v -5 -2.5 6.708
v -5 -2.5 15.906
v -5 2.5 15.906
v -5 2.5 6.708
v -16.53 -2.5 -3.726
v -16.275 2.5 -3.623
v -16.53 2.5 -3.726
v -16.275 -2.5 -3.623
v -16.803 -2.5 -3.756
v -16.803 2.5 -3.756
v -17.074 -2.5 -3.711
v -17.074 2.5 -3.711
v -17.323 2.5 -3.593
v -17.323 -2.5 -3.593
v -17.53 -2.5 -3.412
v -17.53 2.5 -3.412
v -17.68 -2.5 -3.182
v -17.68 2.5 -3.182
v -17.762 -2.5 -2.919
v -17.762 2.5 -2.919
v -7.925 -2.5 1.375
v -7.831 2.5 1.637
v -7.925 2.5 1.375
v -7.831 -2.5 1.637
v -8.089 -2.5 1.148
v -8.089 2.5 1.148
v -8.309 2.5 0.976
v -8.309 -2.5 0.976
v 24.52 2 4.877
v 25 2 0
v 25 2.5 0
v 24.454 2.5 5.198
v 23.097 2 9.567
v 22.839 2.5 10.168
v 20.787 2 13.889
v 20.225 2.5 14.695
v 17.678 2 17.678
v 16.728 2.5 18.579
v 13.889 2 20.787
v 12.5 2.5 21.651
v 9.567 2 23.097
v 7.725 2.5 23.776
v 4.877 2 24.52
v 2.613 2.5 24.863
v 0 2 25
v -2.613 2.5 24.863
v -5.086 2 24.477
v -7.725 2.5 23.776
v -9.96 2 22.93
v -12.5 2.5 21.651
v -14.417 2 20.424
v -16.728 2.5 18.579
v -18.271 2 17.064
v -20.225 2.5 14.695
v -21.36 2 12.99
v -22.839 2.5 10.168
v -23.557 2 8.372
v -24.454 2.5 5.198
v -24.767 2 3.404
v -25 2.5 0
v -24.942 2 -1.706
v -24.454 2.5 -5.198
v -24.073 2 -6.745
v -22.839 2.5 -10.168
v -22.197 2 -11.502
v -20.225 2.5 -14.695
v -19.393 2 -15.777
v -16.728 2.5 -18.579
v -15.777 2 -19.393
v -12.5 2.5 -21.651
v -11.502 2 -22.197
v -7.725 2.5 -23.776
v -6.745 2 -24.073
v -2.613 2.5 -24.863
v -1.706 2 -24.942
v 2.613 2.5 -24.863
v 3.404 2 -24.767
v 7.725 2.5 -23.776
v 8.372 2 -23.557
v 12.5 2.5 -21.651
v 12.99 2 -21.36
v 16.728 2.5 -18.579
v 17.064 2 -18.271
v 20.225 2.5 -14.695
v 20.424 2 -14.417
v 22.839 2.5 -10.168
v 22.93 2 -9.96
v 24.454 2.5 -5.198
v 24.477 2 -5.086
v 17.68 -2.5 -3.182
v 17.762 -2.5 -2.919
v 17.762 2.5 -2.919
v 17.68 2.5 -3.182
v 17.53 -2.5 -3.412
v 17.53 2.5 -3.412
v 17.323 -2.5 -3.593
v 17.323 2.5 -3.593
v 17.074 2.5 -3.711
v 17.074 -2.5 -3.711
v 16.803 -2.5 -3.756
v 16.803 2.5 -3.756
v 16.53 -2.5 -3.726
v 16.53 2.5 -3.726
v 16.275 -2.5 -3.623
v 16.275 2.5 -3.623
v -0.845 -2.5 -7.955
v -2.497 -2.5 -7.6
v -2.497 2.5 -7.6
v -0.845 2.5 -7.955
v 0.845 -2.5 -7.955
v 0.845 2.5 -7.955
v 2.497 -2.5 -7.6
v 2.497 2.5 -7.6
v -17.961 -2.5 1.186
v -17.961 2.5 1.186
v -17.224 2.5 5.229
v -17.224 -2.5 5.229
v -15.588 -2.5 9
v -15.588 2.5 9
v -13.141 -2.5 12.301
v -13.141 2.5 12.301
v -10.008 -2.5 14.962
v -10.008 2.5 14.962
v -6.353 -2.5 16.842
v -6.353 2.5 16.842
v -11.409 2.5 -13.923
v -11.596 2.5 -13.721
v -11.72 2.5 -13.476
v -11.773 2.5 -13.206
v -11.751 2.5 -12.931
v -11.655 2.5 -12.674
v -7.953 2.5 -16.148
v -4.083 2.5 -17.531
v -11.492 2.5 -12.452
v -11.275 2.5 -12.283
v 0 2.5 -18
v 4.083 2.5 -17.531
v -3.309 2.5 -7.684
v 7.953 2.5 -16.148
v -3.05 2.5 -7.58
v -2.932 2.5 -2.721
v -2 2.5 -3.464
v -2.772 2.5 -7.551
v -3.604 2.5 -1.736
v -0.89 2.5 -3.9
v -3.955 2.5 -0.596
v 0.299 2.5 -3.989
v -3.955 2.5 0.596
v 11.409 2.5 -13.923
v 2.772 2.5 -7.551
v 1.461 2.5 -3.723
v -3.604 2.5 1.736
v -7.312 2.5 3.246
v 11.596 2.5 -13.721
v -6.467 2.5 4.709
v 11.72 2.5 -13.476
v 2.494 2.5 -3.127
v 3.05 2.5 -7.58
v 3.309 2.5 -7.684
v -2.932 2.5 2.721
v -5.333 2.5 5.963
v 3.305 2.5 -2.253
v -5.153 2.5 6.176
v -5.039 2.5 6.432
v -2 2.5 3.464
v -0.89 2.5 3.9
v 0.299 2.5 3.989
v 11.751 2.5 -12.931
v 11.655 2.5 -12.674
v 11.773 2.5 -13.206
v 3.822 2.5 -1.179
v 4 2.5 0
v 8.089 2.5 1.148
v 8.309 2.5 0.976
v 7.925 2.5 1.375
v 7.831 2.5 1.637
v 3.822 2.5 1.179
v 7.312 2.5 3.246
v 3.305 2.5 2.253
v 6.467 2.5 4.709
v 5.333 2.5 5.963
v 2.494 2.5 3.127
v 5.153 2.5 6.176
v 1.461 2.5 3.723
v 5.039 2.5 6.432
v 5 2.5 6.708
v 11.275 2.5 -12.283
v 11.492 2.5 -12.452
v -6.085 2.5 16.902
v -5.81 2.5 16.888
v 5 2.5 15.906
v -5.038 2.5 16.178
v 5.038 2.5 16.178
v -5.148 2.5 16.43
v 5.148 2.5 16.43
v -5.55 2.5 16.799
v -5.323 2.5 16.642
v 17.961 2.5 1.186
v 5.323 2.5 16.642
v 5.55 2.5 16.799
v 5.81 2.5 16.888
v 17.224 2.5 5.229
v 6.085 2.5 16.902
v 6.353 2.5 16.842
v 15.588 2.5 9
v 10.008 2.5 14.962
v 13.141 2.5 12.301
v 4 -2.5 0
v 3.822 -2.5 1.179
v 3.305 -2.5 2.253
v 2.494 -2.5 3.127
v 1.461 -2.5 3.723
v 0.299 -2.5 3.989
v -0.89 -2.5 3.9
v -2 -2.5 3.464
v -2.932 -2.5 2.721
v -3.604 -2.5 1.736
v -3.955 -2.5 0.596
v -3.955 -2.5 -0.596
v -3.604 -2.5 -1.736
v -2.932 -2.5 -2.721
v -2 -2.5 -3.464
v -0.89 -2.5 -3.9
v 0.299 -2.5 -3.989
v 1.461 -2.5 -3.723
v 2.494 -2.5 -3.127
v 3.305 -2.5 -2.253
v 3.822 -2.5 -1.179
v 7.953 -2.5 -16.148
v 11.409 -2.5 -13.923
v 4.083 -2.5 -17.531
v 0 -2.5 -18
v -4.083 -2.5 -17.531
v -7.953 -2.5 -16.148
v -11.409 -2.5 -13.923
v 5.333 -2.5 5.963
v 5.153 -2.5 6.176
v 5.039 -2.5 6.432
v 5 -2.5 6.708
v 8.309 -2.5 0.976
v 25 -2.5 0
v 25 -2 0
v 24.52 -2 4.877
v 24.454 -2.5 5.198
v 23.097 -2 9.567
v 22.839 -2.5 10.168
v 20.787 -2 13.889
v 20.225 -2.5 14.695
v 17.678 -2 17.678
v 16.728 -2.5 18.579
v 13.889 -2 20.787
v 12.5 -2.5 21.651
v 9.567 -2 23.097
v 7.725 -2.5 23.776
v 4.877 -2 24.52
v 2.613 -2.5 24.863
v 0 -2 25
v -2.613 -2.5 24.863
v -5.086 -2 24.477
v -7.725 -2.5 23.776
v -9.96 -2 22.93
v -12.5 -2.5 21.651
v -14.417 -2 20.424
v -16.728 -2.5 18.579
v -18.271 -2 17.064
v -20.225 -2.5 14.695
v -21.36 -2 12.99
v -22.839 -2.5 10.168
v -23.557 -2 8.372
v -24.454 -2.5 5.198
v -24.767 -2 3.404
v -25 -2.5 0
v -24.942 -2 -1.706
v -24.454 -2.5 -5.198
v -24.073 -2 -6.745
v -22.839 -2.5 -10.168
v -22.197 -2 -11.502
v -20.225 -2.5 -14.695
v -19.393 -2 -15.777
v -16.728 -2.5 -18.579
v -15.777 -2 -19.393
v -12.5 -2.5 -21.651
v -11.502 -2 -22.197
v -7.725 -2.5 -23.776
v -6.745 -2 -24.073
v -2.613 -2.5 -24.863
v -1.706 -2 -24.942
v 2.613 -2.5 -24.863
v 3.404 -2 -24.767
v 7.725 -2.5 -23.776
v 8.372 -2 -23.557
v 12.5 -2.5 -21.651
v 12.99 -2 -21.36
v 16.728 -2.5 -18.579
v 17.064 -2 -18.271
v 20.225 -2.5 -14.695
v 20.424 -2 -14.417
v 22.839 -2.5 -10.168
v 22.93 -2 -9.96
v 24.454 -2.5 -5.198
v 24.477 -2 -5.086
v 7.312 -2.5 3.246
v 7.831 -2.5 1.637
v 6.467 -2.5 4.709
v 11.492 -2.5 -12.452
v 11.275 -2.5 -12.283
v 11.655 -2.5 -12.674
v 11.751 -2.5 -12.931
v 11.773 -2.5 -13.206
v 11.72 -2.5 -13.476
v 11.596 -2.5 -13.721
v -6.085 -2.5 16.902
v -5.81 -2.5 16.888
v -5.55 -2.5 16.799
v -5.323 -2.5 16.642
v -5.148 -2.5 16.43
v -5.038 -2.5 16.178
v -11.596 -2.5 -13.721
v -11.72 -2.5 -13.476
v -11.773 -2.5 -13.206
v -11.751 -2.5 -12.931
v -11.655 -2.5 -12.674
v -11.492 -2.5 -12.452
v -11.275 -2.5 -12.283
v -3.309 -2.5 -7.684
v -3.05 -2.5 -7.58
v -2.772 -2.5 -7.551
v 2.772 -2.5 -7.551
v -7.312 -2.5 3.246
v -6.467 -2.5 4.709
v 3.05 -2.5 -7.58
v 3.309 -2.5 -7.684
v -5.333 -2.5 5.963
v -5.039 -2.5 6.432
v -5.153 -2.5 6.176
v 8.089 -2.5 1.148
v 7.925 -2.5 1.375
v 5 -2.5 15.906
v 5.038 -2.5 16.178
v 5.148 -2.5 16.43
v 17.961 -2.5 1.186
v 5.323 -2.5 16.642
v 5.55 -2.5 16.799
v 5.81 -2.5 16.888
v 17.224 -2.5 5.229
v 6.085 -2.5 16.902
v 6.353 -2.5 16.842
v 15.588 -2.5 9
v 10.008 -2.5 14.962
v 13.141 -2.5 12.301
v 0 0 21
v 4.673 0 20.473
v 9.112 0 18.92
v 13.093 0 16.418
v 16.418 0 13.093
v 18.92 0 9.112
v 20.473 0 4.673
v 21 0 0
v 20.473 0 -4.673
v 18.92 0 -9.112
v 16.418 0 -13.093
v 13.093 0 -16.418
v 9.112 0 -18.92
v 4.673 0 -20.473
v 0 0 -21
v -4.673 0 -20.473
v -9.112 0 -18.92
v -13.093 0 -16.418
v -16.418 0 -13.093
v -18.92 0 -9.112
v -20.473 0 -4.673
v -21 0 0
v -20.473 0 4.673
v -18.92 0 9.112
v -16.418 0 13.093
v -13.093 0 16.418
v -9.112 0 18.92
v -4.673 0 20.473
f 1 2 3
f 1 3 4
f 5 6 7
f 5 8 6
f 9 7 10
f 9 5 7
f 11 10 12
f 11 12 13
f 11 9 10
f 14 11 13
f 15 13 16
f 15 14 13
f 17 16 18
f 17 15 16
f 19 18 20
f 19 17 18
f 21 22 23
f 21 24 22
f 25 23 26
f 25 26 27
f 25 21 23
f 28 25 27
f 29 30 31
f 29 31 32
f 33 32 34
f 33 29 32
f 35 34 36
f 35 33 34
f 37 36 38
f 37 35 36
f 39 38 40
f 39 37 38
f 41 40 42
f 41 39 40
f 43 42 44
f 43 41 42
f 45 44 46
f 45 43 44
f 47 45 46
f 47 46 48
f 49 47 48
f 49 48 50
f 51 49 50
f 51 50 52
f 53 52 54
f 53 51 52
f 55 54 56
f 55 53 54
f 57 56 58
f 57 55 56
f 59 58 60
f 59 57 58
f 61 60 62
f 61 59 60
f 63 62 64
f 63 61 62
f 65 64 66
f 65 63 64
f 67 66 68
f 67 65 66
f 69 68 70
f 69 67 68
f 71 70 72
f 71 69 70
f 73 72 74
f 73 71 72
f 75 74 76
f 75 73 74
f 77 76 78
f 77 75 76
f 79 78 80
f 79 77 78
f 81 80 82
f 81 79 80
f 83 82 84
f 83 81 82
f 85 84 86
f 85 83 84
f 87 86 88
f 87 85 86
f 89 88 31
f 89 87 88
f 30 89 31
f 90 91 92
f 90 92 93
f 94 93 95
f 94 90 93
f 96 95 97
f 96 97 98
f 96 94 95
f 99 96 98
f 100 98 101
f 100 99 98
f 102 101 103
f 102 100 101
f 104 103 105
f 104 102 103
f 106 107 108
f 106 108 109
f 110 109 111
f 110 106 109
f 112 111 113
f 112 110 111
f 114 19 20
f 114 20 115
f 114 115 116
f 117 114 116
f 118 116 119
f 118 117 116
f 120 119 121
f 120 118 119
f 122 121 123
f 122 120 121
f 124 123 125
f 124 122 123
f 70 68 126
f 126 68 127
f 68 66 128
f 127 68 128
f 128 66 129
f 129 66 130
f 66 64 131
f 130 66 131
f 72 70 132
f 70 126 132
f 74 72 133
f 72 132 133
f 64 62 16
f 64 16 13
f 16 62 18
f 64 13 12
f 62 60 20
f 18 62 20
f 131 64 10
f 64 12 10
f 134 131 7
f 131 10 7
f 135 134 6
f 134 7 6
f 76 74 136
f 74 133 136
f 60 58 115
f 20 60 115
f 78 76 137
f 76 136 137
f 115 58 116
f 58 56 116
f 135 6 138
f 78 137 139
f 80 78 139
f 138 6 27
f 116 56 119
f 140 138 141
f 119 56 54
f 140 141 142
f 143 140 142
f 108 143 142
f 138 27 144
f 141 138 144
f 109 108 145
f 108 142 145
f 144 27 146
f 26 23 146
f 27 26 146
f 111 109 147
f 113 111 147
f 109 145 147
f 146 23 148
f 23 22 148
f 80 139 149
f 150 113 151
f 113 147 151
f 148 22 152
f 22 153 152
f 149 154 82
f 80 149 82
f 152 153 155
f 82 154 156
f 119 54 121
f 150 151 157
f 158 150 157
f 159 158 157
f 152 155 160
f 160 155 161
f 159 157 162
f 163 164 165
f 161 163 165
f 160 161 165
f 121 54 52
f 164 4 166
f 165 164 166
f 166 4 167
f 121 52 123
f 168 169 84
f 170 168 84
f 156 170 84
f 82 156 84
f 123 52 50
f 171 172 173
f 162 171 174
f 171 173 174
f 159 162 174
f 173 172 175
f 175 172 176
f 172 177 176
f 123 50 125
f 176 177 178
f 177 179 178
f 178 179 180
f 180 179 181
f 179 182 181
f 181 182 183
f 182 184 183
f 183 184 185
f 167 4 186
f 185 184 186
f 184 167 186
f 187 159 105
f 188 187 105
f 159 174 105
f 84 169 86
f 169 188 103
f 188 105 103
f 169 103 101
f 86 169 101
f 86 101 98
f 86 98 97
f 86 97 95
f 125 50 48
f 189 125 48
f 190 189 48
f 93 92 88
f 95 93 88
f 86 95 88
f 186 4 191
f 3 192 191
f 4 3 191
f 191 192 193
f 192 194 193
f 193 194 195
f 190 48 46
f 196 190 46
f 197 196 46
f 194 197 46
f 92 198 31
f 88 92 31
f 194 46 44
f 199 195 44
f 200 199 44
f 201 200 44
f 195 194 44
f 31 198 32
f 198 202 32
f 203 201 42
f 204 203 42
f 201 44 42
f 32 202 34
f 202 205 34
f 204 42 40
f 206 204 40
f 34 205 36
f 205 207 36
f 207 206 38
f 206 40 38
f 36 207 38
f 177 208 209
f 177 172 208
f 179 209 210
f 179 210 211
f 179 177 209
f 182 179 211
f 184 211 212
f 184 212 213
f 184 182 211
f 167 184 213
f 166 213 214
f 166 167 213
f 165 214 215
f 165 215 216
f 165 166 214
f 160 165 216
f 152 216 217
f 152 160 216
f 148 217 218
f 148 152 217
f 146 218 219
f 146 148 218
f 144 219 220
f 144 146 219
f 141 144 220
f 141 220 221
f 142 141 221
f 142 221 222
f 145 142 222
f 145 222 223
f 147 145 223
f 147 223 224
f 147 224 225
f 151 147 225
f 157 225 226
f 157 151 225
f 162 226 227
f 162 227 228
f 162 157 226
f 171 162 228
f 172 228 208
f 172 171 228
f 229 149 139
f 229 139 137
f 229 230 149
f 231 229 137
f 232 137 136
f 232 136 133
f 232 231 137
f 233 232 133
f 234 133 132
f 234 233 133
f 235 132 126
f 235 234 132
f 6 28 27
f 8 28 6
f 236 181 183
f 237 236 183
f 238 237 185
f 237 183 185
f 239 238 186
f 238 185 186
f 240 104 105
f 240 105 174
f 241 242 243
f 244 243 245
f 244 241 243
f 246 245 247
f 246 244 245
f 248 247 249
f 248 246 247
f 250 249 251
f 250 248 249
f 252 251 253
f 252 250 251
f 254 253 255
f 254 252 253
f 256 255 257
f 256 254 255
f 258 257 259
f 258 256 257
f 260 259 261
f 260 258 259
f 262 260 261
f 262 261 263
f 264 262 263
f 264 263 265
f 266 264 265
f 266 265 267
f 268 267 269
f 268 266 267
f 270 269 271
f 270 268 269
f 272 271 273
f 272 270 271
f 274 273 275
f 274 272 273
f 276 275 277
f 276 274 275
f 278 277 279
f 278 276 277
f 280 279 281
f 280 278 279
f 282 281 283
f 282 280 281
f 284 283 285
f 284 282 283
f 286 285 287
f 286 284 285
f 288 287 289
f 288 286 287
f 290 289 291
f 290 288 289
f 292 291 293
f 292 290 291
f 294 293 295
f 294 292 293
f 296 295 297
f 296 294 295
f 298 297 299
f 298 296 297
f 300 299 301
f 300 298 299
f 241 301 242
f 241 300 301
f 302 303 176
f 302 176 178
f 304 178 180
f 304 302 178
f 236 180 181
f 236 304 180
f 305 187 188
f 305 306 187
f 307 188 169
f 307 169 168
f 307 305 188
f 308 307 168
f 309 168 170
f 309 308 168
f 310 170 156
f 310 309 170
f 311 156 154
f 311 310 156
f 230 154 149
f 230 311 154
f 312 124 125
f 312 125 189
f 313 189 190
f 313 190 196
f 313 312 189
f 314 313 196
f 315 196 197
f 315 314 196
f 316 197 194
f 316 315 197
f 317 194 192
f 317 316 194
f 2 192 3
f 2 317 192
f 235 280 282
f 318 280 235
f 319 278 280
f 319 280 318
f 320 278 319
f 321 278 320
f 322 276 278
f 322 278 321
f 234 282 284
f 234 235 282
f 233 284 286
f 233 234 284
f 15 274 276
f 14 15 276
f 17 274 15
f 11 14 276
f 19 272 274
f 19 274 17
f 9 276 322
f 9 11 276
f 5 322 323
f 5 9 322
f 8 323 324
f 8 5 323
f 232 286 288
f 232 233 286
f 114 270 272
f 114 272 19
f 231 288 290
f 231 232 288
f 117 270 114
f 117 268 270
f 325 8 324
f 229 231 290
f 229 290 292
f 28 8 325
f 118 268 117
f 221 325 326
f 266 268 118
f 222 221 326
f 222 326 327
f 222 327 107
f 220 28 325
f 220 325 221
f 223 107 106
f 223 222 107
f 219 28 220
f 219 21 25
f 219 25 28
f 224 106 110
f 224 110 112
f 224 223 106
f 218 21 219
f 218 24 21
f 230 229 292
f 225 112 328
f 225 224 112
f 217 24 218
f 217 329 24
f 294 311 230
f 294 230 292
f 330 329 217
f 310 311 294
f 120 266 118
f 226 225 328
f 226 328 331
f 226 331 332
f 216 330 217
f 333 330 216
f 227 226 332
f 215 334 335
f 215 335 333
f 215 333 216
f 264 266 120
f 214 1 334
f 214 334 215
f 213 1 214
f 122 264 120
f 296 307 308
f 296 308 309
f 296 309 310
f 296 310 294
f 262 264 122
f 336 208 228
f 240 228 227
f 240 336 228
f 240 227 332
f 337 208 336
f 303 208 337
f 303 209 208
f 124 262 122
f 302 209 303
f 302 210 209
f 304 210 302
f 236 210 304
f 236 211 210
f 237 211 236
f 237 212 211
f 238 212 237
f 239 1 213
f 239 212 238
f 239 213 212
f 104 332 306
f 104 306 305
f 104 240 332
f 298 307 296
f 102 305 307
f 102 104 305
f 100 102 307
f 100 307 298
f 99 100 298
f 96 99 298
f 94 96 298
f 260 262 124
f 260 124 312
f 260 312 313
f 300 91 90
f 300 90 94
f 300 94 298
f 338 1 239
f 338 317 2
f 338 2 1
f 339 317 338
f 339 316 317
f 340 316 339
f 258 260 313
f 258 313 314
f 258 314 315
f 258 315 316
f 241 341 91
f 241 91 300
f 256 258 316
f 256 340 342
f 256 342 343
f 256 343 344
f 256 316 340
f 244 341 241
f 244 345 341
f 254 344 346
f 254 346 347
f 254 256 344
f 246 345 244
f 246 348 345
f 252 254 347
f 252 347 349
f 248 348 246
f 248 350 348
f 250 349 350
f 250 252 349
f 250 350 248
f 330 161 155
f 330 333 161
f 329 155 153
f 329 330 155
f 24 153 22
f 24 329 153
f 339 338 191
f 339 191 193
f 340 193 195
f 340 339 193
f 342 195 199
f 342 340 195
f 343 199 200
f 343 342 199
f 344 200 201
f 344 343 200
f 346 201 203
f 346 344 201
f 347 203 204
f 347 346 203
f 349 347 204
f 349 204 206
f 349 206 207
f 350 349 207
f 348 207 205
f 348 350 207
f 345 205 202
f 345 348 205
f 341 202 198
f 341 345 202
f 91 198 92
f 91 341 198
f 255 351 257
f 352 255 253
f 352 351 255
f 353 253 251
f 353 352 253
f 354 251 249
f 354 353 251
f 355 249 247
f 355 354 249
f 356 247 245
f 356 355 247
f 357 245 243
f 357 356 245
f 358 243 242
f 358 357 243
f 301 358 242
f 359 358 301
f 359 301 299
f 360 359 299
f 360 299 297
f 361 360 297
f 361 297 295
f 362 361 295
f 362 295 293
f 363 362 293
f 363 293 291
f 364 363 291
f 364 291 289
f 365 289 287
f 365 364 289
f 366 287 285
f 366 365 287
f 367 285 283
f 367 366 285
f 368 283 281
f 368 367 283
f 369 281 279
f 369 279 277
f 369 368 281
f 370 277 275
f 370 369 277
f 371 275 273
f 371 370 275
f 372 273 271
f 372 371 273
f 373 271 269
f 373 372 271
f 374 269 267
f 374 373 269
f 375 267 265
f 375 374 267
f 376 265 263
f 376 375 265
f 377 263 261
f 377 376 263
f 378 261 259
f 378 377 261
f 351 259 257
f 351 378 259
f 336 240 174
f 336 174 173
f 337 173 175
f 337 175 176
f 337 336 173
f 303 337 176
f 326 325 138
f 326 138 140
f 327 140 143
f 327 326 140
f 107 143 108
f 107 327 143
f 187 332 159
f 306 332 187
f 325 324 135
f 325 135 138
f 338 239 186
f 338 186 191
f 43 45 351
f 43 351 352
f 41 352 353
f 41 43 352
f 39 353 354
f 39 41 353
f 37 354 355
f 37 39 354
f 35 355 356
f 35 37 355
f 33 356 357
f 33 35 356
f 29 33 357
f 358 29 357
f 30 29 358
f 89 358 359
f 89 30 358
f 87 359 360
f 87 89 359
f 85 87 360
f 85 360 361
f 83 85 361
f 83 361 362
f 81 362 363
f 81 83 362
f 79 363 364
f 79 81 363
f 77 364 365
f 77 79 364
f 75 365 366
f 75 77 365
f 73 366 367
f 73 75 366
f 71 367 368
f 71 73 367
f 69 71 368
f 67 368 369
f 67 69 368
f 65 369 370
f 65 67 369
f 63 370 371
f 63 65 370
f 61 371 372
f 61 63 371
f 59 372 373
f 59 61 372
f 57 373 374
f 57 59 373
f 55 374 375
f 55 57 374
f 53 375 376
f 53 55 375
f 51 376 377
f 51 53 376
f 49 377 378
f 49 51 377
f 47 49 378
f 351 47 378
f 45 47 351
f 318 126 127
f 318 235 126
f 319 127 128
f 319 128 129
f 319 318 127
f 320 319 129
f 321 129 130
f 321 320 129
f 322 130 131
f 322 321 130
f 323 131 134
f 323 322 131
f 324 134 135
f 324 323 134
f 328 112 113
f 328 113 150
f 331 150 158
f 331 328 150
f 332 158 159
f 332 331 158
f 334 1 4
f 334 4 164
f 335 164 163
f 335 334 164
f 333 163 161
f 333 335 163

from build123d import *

# Parameters (mm, degrees)
F0_R     = 25
F0_R_2   = 4
F1_DEPTH = 2.5


with BuildPart() as f1:
    # F0 (on Front) → F1 (new body, symmetric)
    with BuildSketch(Plane.XZ):
        Circle(F0_R)
        with BuildLine():
            Line((-11.274977, -12.283114), (-3.309475, -7.684229))
            ThreePointArc((-3.309475, -7.684229), (-2.912357, -7.555561), (-2.497311, -7.600226))
            ThreePointArc((-2.497311, -7.600226), (0, -8), (2.497311, -7.600226))
            ThreePointArc((2.497311, -7.600226), (2.912357, -7.555561), (3.309475, -7.684229))
            Line((3.309475, -7.684229), (11.274977, -12.283114))
            ThreePointArc((11.274977, -12.283114), (11.771663, -13.067786), (11.4088, -13.922618))
            ThreePointArc((11.4088, -13.922618), (0, -18), (-11.4088, -13.922618))
            ThreePointArc((-11.4088, -13.922618), (-11.771663, -13.067786), (-11.274977, -12.283114))
        make_face(mode=Mode.SUBTRACT)
        with BuildLine():
            ThreePointArc((-17.761741, -2.919001), (-15.588457, 9), (-6.352941, 16.841619))
            ThreePointArc((-6.352941, 16.841619), (-5.431203, 16.728452), (-5, 15.905974))
            Line((-5, 15.905974), (-5, 6.708204))
            ThreePointArc((-5, 6.708204), (-5.087129, 6.299956), (-5.333333, 5.962848))
            ThreePointArc((-5.333333, 5.962848), (-6.928203, 4), (-7.830644, 1.637378))
            ThreePointArc((-7.830644, 1.637378), (-7.999486, 1.255605), (-8.309475, 0.976025))
            Line((-8.309475, 0.976025), (-16.274977, -3.62286))
            ThreePointArc((-16.274977, -3.62286), (-17.202866, -3.660666), (-17.761741, -2.919001))
        make_face(mode=Mode.SUBTRACT)
        Circle(F0_R_2, mode=Mode.SUBTRACT)
        with BuildLine():
            ThreePointArc((5.333333, 5.962848), (5.087129, 6.299956), (5, 6.708204))
            Line((5, 6.708204), (5, 15.905974))
            ThreePointArc((5, 15.905974), (5.431204, 16.728452), (6.352941, 16.841619))
            ThreePointArc((6.352941, 16.841619), (15.588457, 9), (17.761741, -2.919001))
            ThreePointArc((17.761741, -2.919001), (17.202866, -3.660666), (16.274977, -3.62286))
            Line((16.274977, -3.62286), (8.309475, 0.976025))
            ThreePointArc((8.309475, 0.976025), (7.999486, 1.255605), (7.830644, 1.637378))
            ThreePointArc((7.830644, 1.637378), (6.928203, 4), (5.333333, 5.962848))
        make_face(mode=Mode.SUBTRACT)
    extrude(amount=F1_DEPTH, both=True)

    # F2 (on Right) → F3 (revolve, cut)
    with BuildSketch(Plane.YZ):
        Polygon((-2, 25), (0, 21), (0, 25), align=None)
        Polygon((0, 25), (0, 21), (2, 25), align=None)
    revolve(axis=Axis((0, 0.001726, 0), (0, 1, 0)), mode=Mode.SUBTRACT)


solid = f1.part
